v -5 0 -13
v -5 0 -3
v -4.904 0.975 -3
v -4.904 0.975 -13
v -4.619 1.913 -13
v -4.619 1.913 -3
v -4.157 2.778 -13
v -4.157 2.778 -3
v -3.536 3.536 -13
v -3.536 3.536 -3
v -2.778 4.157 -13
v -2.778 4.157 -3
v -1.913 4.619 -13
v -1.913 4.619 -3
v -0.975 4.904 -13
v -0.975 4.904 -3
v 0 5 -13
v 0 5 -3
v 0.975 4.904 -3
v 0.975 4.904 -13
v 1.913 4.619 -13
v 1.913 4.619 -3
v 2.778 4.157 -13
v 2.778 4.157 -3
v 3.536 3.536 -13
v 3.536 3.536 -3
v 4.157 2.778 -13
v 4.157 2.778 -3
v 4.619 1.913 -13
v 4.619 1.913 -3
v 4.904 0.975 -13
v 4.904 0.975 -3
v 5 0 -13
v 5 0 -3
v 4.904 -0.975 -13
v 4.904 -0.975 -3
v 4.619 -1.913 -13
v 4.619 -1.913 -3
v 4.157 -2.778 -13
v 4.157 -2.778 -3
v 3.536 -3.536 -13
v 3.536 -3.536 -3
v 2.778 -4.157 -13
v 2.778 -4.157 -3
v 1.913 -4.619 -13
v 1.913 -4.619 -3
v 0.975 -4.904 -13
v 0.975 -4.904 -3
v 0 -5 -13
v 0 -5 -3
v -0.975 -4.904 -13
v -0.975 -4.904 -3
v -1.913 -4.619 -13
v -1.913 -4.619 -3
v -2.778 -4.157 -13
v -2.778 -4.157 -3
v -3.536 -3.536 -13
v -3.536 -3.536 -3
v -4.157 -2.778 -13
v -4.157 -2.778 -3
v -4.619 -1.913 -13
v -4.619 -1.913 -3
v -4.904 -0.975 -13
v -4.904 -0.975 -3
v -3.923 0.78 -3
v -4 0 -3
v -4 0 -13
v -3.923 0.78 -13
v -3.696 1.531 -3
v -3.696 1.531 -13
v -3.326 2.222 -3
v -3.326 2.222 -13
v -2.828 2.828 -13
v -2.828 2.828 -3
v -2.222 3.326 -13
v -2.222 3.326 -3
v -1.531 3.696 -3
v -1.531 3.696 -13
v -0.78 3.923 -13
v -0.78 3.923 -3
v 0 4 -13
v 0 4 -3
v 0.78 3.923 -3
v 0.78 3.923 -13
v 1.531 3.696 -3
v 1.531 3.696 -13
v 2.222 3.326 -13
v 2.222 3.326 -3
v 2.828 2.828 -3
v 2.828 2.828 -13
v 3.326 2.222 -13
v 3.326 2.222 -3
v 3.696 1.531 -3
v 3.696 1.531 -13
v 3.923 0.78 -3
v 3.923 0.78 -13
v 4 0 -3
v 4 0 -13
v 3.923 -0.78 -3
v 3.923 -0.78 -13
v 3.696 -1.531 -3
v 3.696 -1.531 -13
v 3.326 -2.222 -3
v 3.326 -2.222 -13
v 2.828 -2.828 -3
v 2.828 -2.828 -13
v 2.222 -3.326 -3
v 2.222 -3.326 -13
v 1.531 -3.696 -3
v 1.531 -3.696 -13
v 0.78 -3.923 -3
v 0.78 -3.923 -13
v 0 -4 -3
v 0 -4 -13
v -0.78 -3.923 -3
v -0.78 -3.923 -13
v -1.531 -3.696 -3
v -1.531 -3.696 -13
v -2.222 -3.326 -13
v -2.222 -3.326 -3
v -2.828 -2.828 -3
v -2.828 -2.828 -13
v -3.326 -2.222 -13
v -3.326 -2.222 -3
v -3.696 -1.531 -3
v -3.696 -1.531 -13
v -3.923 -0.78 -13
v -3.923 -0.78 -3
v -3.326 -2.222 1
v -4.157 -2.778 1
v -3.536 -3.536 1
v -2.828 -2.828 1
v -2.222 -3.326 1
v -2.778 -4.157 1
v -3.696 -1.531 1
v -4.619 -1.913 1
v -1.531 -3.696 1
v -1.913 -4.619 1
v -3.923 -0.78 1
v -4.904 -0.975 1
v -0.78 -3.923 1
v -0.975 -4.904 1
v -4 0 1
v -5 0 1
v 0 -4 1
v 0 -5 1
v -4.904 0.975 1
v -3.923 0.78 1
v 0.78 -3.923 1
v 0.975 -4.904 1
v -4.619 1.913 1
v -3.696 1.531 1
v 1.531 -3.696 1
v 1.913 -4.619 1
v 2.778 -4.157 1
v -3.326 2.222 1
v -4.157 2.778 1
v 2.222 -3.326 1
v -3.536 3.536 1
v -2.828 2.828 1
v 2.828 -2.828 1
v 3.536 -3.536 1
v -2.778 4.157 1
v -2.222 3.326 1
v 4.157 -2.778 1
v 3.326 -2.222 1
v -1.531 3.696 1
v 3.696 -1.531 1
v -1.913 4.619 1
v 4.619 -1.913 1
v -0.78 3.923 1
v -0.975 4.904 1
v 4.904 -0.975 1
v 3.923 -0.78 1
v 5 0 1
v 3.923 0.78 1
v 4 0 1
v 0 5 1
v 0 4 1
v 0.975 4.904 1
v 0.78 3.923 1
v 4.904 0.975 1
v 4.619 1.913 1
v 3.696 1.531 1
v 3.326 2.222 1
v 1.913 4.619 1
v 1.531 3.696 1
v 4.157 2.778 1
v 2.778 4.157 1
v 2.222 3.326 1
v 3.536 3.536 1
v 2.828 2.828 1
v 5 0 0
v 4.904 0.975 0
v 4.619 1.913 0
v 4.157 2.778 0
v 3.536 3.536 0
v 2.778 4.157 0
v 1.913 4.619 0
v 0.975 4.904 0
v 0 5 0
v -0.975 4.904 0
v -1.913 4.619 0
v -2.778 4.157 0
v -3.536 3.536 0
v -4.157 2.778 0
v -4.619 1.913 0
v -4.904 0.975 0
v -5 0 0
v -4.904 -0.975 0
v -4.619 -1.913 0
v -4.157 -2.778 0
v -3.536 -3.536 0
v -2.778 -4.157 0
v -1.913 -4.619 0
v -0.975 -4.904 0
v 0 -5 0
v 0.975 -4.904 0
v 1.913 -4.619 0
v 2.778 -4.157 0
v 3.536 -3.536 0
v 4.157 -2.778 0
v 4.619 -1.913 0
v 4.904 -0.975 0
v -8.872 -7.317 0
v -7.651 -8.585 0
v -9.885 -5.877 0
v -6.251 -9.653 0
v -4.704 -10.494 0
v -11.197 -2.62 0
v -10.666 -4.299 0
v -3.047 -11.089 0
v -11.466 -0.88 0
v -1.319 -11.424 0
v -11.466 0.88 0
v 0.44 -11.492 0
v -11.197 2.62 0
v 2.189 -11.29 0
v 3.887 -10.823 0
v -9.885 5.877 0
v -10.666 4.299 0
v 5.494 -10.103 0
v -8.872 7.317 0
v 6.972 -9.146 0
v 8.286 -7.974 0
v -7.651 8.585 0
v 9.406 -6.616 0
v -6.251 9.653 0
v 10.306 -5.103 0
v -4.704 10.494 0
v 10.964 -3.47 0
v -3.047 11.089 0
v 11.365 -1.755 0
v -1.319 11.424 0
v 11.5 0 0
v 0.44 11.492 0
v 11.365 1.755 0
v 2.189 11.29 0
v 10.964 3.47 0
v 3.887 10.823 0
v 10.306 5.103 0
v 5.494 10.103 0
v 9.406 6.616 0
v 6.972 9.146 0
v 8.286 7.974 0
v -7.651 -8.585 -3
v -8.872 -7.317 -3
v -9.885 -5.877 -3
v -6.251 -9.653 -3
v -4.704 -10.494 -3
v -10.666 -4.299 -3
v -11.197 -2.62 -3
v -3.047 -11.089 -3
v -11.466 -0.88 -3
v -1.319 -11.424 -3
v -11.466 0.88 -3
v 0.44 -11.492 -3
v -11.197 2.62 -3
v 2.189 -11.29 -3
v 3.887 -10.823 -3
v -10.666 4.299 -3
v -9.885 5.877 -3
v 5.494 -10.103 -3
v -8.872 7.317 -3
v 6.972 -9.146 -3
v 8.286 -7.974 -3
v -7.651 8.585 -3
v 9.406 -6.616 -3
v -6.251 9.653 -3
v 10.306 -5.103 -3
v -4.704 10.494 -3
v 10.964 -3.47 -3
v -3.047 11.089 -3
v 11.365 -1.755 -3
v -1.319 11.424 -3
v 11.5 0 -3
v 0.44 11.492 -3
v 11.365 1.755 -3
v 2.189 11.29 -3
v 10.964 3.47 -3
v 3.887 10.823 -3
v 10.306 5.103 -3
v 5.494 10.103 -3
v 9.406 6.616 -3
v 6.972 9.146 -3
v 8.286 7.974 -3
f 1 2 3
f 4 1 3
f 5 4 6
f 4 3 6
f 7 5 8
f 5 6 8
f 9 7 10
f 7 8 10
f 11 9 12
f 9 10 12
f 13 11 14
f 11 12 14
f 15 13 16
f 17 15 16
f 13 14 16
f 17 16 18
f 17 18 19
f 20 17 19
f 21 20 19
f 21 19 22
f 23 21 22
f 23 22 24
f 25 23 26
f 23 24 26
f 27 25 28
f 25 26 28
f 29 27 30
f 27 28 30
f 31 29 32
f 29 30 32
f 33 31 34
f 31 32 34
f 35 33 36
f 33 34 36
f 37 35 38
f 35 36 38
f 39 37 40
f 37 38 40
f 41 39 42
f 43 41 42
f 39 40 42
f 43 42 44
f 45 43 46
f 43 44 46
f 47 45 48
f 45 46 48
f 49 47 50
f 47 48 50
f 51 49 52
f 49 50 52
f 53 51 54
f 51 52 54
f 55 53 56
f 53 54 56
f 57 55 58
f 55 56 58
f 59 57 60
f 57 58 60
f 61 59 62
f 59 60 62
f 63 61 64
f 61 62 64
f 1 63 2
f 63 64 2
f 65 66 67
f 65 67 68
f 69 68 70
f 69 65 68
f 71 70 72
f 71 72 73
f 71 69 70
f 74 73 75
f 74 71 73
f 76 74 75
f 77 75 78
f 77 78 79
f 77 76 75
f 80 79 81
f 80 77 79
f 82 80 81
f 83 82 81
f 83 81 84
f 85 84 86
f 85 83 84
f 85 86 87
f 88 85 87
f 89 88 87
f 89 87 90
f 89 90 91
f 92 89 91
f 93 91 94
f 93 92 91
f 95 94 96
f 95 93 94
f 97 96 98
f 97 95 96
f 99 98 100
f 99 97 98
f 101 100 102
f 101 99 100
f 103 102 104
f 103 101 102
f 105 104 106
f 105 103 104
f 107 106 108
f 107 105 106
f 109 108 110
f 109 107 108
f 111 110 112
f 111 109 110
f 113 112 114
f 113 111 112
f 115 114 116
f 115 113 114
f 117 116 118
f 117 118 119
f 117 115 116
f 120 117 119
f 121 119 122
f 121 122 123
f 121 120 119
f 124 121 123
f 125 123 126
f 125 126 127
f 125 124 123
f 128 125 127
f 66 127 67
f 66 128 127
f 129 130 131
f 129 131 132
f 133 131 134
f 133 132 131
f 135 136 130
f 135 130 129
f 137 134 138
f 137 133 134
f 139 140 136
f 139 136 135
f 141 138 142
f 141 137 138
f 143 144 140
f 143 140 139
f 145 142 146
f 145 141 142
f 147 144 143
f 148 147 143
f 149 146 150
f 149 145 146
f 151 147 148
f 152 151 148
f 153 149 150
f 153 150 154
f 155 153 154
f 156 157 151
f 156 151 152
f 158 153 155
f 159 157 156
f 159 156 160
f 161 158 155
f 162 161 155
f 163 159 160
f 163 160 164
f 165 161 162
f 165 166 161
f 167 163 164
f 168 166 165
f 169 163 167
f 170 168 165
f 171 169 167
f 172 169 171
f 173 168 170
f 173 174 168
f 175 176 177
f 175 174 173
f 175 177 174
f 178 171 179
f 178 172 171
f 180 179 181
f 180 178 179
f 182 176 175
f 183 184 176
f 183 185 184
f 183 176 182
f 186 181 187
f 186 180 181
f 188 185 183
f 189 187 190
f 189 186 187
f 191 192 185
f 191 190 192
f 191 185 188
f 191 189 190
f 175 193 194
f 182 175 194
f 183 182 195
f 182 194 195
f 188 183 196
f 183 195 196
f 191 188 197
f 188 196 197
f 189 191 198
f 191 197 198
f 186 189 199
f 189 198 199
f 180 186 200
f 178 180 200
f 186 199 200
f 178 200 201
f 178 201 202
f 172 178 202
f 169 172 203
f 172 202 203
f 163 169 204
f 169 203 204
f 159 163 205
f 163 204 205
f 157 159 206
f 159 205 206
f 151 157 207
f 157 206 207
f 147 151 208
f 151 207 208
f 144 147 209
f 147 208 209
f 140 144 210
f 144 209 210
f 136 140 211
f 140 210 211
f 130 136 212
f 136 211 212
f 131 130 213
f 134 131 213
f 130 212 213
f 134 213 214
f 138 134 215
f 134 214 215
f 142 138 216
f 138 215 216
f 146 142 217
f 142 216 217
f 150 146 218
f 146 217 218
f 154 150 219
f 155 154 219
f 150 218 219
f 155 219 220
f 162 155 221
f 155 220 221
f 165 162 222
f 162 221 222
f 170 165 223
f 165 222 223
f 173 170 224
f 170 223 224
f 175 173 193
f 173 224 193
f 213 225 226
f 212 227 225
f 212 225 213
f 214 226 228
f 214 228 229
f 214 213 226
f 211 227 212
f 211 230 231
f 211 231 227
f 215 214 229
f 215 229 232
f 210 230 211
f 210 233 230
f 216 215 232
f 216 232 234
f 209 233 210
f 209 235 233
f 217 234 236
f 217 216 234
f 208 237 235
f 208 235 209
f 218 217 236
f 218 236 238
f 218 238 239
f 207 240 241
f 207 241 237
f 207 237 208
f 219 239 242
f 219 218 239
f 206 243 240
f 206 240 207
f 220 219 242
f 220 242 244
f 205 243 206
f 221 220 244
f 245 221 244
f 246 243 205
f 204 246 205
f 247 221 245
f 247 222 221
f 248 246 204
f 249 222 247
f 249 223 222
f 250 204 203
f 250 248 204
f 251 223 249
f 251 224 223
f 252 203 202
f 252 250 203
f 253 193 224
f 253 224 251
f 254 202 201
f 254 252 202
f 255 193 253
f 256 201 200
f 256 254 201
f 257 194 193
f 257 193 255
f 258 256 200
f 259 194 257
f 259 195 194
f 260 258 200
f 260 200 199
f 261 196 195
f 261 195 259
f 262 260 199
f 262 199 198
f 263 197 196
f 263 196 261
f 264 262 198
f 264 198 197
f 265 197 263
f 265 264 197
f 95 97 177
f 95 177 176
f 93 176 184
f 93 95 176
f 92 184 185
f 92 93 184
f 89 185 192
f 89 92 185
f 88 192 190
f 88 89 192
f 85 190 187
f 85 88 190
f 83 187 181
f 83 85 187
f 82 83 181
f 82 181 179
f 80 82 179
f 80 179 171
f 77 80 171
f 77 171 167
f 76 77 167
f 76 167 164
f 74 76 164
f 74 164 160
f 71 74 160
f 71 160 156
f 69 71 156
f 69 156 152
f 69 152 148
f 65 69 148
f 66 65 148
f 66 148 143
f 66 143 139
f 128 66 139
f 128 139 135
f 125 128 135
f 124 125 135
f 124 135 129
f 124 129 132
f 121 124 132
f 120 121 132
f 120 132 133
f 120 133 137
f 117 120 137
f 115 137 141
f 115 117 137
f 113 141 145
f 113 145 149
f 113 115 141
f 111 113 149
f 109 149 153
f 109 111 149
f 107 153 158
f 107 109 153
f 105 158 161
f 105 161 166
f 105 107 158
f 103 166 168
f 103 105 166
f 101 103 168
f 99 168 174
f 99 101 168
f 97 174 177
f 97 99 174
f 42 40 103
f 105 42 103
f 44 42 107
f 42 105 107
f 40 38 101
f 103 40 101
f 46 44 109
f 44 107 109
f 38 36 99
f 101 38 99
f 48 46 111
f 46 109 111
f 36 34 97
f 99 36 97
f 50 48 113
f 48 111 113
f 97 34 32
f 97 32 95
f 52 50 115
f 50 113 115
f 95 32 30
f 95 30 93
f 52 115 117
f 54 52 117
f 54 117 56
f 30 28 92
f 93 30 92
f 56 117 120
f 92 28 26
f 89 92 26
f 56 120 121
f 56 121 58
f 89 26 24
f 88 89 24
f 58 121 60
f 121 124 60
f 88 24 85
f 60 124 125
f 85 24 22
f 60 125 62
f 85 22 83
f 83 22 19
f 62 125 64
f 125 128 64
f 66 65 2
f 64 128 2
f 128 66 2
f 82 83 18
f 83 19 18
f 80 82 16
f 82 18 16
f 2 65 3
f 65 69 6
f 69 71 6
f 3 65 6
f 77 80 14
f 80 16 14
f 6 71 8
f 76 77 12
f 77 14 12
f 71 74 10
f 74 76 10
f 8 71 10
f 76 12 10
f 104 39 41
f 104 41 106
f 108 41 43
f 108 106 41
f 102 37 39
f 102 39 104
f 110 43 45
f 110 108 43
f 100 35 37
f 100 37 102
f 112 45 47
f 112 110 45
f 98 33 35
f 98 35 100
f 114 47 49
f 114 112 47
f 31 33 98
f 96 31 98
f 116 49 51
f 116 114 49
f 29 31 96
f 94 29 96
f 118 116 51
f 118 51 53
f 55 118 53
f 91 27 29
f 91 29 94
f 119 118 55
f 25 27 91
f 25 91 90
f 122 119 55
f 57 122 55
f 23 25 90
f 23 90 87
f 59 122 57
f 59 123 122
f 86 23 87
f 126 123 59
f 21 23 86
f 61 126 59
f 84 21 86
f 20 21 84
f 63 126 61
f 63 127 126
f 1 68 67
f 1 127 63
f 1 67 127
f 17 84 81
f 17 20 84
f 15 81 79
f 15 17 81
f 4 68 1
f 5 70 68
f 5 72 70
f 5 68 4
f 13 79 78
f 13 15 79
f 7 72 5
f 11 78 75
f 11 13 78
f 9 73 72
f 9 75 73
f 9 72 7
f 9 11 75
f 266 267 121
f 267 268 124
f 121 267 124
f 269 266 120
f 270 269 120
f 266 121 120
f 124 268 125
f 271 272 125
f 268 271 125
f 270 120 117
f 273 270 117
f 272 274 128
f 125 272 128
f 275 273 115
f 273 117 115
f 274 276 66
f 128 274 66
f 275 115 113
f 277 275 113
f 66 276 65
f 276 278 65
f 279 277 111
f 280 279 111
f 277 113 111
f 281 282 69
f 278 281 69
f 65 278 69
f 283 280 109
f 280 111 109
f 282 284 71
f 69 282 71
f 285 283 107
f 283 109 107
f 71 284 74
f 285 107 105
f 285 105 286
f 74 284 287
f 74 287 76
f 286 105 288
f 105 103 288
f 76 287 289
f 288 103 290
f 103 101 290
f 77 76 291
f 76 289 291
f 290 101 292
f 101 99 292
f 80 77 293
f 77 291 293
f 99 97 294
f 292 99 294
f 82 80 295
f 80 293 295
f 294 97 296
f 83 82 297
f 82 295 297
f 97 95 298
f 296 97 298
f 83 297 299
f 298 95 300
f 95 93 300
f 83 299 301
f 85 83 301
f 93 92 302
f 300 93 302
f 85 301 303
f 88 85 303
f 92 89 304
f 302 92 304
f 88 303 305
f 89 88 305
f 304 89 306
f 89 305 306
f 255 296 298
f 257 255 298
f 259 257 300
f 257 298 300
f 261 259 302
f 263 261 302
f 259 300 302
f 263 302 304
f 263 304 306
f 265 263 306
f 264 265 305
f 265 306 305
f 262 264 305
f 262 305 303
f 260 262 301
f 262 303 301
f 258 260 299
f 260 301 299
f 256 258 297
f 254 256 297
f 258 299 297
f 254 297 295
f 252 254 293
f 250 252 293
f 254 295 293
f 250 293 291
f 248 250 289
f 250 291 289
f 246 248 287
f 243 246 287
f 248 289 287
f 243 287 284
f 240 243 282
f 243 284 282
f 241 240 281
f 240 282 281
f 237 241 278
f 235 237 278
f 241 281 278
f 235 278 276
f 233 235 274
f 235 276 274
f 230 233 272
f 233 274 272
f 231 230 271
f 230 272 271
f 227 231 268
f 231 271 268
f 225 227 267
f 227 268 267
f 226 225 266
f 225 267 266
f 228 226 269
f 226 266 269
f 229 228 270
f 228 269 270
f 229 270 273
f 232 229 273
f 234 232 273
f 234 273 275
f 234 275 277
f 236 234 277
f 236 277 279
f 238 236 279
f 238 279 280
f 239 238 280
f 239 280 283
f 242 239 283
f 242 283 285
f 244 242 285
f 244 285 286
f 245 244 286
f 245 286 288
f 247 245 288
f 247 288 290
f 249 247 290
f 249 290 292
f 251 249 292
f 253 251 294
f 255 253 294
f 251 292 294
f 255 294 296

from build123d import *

# Parameters (mm, degrees)
SKETCH1_R           = 5
SKETCH1_R_2         = 4
BOSS_EXTRUDE1_DEPTH = 1
BOSS_EXTRUDE2_START = -3
SKETCH2_R           = 11.5
SKETCH2_R_2         = 4
BOSS_EXTRUDE2_DEPTH = 3
SKETCH5_R           = 5
SKETCH5_R_2         = 4
BOSS_EXTRUDE3_DEPTH = 10


with BuildPart() as part:
    # Sketch1 → Boss-Extrude1 (new body)
    with BuildSketch(Plane.XY):
        Circle(SKETCH1_R)
        Circle(SKETCH1_R_2, mode=Mode.SUBTRACT)
    extrude(amount=BOSS_EXTRUDE1_DEPTH)

    # Sketch2 → Boss-Extrude2 (add)
    with BuildSketch(Plane.XY.offset(BOSS_EXTRUDE2_START)):
        Circle(SKETCH2_R)
        Circle(SKETCH2_R_2, mode=Mode.SUBTRACT)
    extrude(amount=BOSS_EXTRUDE2_DEPTH)


with BuildPart() as body_2:
    # Sketch5 → Boss-Extrude3 (new body)
    with BuildSketch(Plane(origin=(0, 0, -3), x_dir=(-1, 0, 0), z_dir=(0, 0, -1))):
        Circle(SKETCH5_R)
        Circle(SKETCH5_R_2, mode=Mode.SUBTRACT)
    extrude(amount=BOSS_EXTRUDE3_DEPTH)


solid = Compound([part.part, body_2.part])
